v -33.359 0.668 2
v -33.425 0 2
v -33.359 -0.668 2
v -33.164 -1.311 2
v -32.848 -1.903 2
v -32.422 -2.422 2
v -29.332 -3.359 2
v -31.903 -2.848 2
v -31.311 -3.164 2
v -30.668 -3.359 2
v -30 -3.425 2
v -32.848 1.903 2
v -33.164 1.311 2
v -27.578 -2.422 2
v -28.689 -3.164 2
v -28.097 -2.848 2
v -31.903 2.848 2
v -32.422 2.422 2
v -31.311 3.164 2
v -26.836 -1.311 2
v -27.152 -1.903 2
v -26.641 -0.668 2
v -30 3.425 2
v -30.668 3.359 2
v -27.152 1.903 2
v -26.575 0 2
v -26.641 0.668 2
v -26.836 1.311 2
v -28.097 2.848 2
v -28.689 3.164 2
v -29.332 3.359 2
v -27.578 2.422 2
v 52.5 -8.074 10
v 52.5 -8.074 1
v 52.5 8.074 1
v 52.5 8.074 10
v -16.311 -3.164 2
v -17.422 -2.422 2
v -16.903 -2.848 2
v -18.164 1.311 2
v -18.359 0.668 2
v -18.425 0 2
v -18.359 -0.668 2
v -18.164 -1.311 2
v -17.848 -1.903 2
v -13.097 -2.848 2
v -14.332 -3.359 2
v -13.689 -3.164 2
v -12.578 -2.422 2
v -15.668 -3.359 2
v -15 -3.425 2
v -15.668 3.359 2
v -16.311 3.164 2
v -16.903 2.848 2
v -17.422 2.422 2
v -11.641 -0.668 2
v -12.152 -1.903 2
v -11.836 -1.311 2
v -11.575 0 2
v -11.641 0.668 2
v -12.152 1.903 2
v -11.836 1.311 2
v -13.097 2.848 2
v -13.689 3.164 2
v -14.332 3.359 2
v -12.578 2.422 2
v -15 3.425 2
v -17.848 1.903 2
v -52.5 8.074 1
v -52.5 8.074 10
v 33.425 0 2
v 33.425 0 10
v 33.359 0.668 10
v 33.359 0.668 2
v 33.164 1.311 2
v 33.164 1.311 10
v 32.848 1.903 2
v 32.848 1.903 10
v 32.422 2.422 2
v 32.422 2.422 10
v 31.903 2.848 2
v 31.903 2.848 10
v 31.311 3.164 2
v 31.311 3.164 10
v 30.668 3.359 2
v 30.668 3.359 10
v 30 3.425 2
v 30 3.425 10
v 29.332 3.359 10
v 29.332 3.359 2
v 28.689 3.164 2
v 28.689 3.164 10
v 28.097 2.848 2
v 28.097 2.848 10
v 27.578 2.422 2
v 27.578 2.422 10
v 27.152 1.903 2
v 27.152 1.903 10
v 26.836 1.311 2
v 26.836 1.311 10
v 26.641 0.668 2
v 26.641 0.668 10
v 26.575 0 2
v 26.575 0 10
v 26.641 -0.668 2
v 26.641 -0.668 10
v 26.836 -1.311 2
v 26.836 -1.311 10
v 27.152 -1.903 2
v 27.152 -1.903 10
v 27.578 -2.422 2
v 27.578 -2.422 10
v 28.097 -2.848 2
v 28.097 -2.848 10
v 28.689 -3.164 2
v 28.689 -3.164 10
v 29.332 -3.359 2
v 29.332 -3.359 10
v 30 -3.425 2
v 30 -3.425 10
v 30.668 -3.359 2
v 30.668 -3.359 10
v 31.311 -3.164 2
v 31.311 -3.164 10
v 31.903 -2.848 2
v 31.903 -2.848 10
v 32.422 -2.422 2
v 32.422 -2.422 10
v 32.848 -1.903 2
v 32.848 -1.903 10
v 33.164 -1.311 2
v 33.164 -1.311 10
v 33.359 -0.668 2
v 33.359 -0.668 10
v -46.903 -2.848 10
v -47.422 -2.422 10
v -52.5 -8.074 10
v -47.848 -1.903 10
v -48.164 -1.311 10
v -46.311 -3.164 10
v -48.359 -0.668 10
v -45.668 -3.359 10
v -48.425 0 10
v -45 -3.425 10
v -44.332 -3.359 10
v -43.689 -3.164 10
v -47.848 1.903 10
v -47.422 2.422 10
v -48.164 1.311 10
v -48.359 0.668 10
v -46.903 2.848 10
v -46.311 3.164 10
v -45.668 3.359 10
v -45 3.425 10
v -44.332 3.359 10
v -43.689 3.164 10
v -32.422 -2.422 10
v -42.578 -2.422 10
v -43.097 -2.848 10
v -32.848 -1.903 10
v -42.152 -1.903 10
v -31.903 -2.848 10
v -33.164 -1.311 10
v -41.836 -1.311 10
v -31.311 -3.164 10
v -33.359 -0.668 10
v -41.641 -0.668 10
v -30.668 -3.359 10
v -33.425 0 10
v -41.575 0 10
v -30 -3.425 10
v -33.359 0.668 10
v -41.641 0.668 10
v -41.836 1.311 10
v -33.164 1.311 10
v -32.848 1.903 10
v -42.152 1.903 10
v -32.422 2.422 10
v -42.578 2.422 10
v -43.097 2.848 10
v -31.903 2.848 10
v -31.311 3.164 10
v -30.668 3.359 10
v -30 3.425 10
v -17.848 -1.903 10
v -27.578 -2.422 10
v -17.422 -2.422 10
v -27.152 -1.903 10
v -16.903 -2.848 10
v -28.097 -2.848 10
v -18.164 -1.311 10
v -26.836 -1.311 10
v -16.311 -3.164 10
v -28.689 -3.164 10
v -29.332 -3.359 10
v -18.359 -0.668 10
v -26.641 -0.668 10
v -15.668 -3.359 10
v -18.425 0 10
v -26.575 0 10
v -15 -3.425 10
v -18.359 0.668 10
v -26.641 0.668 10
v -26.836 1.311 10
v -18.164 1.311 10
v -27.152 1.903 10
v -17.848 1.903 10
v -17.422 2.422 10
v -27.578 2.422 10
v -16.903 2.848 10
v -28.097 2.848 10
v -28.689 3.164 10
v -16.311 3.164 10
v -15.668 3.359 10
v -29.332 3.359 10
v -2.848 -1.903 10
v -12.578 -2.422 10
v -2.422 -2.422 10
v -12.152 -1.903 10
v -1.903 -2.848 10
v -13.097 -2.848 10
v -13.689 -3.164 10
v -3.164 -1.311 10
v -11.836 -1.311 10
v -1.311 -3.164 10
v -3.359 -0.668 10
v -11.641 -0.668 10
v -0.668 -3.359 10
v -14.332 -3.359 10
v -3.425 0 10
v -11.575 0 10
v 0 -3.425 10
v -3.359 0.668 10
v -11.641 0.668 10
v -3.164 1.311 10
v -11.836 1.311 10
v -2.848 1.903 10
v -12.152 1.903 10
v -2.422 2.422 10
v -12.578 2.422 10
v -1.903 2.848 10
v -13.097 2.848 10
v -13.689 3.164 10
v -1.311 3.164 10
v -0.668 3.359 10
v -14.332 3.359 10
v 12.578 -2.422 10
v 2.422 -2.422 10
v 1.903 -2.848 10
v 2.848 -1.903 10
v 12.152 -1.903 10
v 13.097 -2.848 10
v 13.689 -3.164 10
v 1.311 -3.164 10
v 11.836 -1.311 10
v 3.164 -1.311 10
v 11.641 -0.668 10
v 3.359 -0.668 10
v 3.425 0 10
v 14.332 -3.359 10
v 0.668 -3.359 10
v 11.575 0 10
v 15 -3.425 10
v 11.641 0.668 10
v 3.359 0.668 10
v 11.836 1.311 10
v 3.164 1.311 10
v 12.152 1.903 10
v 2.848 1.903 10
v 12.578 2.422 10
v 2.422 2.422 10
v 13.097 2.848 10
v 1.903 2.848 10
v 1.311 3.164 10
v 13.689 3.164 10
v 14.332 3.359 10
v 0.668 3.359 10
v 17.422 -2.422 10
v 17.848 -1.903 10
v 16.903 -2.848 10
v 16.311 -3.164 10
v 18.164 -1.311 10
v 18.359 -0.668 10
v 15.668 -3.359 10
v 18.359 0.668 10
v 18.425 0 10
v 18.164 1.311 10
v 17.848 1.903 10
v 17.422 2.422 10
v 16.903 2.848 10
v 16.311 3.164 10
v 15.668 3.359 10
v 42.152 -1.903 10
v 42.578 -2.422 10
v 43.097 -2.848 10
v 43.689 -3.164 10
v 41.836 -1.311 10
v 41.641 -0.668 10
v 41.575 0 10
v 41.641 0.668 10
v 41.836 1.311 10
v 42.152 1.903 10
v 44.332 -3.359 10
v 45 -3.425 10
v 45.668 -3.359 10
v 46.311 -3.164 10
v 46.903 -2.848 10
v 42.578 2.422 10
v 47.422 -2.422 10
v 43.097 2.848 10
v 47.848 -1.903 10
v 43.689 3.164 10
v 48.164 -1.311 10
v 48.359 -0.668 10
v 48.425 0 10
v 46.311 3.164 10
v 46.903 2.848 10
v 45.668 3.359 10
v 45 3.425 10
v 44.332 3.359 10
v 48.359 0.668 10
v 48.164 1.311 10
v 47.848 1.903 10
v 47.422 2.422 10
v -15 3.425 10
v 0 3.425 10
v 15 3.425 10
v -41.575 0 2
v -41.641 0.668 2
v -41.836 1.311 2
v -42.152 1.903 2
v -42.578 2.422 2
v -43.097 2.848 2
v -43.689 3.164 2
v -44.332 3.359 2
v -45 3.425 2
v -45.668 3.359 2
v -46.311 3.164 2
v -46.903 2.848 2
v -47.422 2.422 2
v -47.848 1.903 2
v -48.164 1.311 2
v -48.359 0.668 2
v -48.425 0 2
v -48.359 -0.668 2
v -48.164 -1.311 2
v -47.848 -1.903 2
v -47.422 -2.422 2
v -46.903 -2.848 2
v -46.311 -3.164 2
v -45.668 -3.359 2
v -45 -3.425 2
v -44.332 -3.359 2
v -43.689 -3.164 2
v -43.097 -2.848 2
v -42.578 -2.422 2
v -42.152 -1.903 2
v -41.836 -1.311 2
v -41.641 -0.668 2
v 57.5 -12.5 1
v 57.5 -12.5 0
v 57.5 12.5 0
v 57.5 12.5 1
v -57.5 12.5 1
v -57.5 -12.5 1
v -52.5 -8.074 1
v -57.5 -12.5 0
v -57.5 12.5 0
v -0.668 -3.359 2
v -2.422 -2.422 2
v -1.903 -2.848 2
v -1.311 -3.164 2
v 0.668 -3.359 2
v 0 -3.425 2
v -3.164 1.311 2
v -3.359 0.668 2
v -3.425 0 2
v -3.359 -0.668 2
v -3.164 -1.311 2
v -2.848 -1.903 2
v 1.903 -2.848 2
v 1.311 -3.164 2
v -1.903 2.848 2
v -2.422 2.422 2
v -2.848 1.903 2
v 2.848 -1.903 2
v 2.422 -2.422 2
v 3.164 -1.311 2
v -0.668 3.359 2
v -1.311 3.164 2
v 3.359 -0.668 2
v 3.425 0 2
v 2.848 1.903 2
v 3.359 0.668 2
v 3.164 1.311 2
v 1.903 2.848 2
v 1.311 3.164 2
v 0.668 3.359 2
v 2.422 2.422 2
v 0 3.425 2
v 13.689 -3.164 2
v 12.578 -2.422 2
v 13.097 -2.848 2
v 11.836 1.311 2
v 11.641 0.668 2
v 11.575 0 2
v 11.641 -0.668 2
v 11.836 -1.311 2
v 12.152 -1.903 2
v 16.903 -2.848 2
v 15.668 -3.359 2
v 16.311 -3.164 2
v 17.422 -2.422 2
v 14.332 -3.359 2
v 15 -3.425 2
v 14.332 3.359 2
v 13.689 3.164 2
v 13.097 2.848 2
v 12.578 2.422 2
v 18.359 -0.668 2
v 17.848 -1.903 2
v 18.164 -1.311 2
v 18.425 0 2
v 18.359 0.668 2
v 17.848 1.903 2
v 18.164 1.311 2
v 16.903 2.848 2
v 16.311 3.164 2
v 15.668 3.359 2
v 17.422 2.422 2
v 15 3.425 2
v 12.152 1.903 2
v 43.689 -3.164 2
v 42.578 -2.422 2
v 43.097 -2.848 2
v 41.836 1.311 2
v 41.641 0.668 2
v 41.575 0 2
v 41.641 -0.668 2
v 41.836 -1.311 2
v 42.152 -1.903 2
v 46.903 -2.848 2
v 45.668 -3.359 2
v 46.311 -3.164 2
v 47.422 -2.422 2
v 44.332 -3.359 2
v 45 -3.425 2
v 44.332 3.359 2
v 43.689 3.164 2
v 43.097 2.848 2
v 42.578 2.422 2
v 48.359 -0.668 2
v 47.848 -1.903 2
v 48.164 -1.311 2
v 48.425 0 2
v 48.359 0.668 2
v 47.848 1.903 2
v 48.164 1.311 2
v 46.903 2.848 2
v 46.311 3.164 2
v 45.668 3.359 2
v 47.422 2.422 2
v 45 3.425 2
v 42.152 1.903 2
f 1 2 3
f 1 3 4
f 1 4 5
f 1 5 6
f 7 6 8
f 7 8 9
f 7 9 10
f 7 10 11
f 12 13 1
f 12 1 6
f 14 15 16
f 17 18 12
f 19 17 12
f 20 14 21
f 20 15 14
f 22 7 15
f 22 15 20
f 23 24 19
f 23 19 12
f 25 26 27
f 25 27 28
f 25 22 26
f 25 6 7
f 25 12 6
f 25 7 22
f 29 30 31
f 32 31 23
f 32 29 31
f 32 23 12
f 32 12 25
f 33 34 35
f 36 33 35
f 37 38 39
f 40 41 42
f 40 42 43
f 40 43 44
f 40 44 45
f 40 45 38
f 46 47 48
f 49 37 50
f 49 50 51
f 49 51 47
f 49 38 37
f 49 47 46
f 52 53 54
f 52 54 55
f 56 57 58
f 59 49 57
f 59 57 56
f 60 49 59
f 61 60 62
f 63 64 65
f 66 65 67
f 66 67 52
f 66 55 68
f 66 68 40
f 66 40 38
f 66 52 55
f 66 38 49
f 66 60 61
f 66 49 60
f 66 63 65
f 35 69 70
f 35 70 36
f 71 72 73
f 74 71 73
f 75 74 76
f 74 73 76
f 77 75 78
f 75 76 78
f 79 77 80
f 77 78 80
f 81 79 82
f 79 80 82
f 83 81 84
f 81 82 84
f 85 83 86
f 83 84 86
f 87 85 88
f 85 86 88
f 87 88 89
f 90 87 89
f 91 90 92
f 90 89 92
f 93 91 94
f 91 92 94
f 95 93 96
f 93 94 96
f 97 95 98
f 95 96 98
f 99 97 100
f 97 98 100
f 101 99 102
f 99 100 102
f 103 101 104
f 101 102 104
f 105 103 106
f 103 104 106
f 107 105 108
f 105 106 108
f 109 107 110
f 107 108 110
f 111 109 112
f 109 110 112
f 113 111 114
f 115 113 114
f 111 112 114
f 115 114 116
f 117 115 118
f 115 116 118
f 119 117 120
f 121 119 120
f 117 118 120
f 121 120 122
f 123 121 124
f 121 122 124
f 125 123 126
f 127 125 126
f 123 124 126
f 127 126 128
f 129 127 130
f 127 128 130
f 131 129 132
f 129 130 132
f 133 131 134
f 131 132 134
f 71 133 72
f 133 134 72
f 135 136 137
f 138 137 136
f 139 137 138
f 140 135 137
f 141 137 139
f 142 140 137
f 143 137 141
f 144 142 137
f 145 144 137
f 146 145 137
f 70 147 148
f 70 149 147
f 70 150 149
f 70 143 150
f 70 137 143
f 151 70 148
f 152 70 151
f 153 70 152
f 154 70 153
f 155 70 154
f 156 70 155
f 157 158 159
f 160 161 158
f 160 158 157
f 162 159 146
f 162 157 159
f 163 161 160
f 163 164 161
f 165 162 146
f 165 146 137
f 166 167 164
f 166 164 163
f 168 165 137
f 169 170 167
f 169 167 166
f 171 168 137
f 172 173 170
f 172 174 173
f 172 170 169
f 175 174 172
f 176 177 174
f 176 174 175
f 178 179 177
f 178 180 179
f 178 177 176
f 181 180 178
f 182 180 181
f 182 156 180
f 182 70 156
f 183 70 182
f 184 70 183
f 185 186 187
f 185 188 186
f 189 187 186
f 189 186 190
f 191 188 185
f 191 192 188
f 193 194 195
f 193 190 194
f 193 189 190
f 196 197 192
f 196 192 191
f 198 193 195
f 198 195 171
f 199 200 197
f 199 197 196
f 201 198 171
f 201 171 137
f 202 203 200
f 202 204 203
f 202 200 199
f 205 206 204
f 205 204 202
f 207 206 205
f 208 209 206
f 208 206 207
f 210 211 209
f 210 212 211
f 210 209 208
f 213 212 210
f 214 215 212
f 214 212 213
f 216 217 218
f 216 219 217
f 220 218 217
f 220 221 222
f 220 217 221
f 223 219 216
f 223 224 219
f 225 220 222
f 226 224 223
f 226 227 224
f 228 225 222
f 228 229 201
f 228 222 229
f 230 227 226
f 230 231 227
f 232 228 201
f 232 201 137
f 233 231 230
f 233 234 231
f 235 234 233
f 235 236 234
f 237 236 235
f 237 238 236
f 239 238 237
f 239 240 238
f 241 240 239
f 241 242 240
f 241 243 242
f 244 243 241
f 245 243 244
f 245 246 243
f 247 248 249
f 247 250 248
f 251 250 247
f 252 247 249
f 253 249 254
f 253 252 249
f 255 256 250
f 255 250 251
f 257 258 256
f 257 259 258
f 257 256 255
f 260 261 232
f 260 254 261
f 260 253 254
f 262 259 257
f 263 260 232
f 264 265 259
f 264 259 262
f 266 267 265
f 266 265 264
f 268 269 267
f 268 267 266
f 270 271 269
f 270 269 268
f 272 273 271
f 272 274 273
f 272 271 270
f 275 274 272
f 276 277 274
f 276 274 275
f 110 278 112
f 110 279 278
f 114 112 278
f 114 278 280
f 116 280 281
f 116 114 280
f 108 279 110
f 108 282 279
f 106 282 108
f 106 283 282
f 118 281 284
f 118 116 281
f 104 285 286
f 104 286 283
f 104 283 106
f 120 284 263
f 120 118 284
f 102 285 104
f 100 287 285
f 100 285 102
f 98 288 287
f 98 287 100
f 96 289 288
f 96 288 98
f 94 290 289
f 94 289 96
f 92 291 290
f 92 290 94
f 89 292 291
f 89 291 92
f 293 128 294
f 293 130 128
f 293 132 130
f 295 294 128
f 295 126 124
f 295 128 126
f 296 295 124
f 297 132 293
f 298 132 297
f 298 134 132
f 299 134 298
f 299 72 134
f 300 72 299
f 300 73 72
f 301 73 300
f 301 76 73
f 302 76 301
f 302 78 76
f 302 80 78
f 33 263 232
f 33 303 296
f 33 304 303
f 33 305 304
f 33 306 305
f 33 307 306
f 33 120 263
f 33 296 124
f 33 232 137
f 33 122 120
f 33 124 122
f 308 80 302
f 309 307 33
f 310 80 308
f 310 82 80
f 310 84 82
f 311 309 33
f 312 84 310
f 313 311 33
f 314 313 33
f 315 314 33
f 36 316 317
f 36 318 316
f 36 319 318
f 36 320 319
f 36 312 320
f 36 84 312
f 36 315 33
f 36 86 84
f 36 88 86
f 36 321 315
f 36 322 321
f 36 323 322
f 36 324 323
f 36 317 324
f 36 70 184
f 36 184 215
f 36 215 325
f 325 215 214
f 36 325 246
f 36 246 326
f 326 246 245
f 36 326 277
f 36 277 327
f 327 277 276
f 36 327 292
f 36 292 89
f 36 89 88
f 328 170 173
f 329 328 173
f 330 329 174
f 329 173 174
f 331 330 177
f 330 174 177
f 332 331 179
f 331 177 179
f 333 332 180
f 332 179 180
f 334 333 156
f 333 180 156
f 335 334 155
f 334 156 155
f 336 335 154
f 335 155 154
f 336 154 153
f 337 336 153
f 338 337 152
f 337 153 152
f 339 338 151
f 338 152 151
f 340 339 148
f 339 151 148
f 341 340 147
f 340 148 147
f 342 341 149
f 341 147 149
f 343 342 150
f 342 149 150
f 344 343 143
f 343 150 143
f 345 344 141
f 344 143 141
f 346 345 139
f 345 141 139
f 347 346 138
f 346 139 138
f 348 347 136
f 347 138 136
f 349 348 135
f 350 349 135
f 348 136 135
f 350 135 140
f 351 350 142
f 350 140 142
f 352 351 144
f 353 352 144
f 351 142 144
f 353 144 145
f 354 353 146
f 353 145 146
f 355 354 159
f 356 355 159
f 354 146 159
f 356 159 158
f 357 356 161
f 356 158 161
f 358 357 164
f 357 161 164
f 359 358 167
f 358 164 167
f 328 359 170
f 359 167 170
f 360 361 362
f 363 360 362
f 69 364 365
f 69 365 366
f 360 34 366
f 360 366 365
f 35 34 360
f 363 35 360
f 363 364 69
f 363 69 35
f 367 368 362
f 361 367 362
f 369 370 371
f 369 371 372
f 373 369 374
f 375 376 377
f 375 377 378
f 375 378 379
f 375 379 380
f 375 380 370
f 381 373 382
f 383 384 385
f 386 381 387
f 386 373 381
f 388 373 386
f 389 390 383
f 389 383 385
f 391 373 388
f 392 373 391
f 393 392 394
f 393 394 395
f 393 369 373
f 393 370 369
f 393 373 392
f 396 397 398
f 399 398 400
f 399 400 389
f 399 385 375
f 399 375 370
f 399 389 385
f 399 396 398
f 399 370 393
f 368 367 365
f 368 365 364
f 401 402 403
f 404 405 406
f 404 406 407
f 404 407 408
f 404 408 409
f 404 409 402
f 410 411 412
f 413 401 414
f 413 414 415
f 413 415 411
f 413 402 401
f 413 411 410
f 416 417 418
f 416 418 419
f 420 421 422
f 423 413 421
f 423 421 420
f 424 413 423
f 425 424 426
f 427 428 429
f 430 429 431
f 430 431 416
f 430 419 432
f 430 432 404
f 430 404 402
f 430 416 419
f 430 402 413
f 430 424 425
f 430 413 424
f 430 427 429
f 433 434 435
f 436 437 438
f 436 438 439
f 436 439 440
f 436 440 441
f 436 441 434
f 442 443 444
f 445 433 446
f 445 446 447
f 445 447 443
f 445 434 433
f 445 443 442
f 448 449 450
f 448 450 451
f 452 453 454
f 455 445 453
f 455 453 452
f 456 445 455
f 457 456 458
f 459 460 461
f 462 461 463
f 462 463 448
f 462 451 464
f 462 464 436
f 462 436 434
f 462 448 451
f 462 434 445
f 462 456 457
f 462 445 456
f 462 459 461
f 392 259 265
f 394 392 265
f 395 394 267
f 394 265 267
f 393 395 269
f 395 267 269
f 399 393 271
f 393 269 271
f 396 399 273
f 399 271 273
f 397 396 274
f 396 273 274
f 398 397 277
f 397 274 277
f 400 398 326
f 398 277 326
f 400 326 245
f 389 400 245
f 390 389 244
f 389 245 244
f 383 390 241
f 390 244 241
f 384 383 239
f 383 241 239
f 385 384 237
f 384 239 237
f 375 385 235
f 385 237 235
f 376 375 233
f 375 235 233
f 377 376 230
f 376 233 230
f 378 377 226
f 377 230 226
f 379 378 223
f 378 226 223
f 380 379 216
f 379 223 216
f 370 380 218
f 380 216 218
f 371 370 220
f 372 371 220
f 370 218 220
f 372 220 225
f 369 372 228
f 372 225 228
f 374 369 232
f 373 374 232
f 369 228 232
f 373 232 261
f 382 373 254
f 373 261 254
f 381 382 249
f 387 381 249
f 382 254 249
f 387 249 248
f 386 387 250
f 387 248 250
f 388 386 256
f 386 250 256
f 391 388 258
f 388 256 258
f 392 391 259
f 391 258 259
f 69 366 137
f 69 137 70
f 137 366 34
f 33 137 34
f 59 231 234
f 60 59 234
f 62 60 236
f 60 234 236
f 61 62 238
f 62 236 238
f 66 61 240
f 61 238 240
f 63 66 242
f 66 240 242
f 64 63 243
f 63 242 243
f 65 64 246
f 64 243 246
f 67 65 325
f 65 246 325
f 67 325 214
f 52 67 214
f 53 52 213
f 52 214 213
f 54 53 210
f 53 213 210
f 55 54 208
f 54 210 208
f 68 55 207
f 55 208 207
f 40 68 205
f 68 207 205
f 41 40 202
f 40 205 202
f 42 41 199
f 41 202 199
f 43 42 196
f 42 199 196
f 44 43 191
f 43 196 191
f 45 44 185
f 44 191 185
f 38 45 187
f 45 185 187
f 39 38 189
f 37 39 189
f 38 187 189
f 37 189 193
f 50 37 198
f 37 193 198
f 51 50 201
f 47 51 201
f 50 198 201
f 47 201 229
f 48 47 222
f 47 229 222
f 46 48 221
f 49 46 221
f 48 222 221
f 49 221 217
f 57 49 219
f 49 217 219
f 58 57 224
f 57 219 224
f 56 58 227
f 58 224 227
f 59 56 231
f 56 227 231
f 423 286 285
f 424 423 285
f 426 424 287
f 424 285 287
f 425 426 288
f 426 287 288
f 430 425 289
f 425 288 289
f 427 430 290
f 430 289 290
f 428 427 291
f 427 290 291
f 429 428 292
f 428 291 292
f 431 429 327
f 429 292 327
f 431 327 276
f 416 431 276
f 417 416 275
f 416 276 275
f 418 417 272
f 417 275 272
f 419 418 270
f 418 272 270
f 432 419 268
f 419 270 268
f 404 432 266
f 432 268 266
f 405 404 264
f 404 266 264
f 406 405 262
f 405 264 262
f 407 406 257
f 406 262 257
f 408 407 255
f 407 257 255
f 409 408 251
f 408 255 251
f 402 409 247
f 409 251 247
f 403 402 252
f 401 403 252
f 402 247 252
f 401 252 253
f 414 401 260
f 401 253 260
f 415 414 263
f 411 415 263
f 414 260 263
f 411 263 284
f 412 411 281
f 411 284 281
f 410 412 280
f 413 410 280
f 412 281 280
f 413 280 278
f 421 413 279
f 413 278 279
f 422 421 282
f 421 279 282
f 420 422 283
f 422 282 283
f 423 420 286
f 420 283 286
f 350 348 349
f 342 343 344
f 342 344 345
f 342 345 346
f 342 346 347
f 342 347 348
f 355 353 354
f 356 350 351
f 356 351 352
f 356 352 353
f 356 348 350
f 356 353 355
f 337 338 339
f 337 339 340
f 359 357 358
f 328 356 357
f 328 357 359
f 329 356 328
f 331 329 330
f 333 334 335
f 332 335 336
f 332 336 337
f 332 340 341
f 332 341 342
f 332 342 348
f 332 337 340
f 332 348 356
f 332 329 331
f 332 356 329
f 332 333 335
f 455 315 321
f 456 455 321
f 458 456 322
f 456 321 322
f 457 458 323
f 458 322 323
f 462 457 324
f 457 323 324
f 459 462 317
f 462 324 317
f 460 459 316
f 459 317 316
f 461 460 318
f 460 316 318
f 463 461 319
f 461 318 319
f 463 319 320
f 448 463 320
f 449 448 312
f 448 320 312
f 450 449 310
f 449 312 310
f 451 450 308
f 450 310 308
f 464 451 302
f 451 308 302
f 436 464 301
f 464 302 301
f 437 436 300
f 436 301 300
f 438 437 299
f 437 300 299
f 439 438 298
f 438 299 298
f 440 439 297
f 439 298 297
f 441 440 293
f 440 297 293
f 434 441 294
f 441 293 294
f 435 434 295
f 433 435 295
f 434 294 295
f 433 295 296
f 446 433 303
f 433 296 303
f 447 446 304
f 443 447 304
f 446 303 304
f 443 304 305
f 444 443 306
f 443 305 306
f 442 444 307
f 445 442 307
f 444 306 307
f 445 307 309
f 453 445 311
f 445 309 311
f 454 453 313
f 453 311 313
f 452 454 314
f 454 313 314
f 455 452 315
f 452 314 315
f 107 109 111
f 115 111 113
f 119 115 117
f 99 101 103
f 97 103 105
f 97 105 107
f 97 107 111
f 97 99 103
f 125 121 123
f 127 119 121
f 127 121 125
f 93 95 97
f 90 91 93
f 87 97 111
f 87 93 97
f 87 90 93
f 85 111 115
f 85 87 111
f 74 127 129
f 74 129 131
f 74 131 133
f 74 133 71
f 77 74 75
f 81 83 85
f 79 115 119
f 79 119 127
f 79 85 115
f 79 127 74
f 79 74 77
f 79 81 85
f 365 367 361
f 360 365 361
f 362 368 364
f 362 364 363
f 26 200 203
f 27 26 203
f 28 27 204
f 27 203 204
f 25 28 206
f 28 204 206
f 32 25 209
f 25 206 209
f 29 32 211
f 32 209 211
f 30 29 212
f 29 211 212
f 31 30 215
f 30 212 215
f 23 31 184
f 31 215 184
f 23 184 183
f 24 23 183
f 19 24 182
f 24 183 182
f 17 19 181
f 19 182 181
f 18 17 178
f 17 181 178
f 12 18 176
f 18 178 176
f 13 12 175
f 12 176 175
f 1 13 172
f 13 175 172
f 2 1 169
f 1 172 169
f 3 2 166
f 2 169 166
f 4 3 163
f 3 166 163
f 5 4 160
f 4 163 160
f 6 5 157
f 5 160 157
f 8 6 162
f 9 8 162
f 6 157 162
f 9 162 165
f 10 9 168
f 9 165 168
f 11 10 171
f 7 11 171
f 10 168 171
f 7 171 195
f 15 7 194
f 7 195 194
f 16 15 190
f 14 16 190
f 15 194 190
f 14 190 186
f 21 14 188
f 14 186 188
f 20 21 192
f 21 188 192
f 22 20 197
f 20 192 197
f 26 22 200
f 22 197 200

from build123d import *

# Parameters (mm, degrees)
F2_W     = 115
F2_H     = 25
F3_DEPTH = 1
F4_W     = 105
F4_H     = 16.148975119
F5_DEPTH = 9
F6_R     = 3.425
F7_DEPTH = 8


with BuildPart() as f3:
    # F2 (on Top) → F3 (new body)
    with BuildSketch(Plane.XY):
        Rectangle(F2_W, F2_H)
    extrude(amount=F3_DEPTH)

    # F4 (on face) → F5 (join)
    with BuildSketch(Plane.XY.offset(1)):
        Rectangle(F4_W, F4_H)
    extrude(amount=F5_DEPTH)

    # F6 (on face) → F7 (cut)
    with BuildSketch(Plane.XY.offset(10)):
        with Locations((-45, 0)):
            Circle(F6_R)
        with Locations((-30, 0)):
            Circle(F6_R)
        with Locations((-15, 0)):
            Circle(F6_R)
        Circle(F6_R)
        with Locations((15, 0)):
            Circle(F6_R)
        with Locations((30, 0)):
            Circle(F6_R)
        with Locations((45, 0)):
            Circle(F6_R)
    extrude(amount=-F7_DEPTH, mode=Mode.SUBTRACT)


solid = f3.part
